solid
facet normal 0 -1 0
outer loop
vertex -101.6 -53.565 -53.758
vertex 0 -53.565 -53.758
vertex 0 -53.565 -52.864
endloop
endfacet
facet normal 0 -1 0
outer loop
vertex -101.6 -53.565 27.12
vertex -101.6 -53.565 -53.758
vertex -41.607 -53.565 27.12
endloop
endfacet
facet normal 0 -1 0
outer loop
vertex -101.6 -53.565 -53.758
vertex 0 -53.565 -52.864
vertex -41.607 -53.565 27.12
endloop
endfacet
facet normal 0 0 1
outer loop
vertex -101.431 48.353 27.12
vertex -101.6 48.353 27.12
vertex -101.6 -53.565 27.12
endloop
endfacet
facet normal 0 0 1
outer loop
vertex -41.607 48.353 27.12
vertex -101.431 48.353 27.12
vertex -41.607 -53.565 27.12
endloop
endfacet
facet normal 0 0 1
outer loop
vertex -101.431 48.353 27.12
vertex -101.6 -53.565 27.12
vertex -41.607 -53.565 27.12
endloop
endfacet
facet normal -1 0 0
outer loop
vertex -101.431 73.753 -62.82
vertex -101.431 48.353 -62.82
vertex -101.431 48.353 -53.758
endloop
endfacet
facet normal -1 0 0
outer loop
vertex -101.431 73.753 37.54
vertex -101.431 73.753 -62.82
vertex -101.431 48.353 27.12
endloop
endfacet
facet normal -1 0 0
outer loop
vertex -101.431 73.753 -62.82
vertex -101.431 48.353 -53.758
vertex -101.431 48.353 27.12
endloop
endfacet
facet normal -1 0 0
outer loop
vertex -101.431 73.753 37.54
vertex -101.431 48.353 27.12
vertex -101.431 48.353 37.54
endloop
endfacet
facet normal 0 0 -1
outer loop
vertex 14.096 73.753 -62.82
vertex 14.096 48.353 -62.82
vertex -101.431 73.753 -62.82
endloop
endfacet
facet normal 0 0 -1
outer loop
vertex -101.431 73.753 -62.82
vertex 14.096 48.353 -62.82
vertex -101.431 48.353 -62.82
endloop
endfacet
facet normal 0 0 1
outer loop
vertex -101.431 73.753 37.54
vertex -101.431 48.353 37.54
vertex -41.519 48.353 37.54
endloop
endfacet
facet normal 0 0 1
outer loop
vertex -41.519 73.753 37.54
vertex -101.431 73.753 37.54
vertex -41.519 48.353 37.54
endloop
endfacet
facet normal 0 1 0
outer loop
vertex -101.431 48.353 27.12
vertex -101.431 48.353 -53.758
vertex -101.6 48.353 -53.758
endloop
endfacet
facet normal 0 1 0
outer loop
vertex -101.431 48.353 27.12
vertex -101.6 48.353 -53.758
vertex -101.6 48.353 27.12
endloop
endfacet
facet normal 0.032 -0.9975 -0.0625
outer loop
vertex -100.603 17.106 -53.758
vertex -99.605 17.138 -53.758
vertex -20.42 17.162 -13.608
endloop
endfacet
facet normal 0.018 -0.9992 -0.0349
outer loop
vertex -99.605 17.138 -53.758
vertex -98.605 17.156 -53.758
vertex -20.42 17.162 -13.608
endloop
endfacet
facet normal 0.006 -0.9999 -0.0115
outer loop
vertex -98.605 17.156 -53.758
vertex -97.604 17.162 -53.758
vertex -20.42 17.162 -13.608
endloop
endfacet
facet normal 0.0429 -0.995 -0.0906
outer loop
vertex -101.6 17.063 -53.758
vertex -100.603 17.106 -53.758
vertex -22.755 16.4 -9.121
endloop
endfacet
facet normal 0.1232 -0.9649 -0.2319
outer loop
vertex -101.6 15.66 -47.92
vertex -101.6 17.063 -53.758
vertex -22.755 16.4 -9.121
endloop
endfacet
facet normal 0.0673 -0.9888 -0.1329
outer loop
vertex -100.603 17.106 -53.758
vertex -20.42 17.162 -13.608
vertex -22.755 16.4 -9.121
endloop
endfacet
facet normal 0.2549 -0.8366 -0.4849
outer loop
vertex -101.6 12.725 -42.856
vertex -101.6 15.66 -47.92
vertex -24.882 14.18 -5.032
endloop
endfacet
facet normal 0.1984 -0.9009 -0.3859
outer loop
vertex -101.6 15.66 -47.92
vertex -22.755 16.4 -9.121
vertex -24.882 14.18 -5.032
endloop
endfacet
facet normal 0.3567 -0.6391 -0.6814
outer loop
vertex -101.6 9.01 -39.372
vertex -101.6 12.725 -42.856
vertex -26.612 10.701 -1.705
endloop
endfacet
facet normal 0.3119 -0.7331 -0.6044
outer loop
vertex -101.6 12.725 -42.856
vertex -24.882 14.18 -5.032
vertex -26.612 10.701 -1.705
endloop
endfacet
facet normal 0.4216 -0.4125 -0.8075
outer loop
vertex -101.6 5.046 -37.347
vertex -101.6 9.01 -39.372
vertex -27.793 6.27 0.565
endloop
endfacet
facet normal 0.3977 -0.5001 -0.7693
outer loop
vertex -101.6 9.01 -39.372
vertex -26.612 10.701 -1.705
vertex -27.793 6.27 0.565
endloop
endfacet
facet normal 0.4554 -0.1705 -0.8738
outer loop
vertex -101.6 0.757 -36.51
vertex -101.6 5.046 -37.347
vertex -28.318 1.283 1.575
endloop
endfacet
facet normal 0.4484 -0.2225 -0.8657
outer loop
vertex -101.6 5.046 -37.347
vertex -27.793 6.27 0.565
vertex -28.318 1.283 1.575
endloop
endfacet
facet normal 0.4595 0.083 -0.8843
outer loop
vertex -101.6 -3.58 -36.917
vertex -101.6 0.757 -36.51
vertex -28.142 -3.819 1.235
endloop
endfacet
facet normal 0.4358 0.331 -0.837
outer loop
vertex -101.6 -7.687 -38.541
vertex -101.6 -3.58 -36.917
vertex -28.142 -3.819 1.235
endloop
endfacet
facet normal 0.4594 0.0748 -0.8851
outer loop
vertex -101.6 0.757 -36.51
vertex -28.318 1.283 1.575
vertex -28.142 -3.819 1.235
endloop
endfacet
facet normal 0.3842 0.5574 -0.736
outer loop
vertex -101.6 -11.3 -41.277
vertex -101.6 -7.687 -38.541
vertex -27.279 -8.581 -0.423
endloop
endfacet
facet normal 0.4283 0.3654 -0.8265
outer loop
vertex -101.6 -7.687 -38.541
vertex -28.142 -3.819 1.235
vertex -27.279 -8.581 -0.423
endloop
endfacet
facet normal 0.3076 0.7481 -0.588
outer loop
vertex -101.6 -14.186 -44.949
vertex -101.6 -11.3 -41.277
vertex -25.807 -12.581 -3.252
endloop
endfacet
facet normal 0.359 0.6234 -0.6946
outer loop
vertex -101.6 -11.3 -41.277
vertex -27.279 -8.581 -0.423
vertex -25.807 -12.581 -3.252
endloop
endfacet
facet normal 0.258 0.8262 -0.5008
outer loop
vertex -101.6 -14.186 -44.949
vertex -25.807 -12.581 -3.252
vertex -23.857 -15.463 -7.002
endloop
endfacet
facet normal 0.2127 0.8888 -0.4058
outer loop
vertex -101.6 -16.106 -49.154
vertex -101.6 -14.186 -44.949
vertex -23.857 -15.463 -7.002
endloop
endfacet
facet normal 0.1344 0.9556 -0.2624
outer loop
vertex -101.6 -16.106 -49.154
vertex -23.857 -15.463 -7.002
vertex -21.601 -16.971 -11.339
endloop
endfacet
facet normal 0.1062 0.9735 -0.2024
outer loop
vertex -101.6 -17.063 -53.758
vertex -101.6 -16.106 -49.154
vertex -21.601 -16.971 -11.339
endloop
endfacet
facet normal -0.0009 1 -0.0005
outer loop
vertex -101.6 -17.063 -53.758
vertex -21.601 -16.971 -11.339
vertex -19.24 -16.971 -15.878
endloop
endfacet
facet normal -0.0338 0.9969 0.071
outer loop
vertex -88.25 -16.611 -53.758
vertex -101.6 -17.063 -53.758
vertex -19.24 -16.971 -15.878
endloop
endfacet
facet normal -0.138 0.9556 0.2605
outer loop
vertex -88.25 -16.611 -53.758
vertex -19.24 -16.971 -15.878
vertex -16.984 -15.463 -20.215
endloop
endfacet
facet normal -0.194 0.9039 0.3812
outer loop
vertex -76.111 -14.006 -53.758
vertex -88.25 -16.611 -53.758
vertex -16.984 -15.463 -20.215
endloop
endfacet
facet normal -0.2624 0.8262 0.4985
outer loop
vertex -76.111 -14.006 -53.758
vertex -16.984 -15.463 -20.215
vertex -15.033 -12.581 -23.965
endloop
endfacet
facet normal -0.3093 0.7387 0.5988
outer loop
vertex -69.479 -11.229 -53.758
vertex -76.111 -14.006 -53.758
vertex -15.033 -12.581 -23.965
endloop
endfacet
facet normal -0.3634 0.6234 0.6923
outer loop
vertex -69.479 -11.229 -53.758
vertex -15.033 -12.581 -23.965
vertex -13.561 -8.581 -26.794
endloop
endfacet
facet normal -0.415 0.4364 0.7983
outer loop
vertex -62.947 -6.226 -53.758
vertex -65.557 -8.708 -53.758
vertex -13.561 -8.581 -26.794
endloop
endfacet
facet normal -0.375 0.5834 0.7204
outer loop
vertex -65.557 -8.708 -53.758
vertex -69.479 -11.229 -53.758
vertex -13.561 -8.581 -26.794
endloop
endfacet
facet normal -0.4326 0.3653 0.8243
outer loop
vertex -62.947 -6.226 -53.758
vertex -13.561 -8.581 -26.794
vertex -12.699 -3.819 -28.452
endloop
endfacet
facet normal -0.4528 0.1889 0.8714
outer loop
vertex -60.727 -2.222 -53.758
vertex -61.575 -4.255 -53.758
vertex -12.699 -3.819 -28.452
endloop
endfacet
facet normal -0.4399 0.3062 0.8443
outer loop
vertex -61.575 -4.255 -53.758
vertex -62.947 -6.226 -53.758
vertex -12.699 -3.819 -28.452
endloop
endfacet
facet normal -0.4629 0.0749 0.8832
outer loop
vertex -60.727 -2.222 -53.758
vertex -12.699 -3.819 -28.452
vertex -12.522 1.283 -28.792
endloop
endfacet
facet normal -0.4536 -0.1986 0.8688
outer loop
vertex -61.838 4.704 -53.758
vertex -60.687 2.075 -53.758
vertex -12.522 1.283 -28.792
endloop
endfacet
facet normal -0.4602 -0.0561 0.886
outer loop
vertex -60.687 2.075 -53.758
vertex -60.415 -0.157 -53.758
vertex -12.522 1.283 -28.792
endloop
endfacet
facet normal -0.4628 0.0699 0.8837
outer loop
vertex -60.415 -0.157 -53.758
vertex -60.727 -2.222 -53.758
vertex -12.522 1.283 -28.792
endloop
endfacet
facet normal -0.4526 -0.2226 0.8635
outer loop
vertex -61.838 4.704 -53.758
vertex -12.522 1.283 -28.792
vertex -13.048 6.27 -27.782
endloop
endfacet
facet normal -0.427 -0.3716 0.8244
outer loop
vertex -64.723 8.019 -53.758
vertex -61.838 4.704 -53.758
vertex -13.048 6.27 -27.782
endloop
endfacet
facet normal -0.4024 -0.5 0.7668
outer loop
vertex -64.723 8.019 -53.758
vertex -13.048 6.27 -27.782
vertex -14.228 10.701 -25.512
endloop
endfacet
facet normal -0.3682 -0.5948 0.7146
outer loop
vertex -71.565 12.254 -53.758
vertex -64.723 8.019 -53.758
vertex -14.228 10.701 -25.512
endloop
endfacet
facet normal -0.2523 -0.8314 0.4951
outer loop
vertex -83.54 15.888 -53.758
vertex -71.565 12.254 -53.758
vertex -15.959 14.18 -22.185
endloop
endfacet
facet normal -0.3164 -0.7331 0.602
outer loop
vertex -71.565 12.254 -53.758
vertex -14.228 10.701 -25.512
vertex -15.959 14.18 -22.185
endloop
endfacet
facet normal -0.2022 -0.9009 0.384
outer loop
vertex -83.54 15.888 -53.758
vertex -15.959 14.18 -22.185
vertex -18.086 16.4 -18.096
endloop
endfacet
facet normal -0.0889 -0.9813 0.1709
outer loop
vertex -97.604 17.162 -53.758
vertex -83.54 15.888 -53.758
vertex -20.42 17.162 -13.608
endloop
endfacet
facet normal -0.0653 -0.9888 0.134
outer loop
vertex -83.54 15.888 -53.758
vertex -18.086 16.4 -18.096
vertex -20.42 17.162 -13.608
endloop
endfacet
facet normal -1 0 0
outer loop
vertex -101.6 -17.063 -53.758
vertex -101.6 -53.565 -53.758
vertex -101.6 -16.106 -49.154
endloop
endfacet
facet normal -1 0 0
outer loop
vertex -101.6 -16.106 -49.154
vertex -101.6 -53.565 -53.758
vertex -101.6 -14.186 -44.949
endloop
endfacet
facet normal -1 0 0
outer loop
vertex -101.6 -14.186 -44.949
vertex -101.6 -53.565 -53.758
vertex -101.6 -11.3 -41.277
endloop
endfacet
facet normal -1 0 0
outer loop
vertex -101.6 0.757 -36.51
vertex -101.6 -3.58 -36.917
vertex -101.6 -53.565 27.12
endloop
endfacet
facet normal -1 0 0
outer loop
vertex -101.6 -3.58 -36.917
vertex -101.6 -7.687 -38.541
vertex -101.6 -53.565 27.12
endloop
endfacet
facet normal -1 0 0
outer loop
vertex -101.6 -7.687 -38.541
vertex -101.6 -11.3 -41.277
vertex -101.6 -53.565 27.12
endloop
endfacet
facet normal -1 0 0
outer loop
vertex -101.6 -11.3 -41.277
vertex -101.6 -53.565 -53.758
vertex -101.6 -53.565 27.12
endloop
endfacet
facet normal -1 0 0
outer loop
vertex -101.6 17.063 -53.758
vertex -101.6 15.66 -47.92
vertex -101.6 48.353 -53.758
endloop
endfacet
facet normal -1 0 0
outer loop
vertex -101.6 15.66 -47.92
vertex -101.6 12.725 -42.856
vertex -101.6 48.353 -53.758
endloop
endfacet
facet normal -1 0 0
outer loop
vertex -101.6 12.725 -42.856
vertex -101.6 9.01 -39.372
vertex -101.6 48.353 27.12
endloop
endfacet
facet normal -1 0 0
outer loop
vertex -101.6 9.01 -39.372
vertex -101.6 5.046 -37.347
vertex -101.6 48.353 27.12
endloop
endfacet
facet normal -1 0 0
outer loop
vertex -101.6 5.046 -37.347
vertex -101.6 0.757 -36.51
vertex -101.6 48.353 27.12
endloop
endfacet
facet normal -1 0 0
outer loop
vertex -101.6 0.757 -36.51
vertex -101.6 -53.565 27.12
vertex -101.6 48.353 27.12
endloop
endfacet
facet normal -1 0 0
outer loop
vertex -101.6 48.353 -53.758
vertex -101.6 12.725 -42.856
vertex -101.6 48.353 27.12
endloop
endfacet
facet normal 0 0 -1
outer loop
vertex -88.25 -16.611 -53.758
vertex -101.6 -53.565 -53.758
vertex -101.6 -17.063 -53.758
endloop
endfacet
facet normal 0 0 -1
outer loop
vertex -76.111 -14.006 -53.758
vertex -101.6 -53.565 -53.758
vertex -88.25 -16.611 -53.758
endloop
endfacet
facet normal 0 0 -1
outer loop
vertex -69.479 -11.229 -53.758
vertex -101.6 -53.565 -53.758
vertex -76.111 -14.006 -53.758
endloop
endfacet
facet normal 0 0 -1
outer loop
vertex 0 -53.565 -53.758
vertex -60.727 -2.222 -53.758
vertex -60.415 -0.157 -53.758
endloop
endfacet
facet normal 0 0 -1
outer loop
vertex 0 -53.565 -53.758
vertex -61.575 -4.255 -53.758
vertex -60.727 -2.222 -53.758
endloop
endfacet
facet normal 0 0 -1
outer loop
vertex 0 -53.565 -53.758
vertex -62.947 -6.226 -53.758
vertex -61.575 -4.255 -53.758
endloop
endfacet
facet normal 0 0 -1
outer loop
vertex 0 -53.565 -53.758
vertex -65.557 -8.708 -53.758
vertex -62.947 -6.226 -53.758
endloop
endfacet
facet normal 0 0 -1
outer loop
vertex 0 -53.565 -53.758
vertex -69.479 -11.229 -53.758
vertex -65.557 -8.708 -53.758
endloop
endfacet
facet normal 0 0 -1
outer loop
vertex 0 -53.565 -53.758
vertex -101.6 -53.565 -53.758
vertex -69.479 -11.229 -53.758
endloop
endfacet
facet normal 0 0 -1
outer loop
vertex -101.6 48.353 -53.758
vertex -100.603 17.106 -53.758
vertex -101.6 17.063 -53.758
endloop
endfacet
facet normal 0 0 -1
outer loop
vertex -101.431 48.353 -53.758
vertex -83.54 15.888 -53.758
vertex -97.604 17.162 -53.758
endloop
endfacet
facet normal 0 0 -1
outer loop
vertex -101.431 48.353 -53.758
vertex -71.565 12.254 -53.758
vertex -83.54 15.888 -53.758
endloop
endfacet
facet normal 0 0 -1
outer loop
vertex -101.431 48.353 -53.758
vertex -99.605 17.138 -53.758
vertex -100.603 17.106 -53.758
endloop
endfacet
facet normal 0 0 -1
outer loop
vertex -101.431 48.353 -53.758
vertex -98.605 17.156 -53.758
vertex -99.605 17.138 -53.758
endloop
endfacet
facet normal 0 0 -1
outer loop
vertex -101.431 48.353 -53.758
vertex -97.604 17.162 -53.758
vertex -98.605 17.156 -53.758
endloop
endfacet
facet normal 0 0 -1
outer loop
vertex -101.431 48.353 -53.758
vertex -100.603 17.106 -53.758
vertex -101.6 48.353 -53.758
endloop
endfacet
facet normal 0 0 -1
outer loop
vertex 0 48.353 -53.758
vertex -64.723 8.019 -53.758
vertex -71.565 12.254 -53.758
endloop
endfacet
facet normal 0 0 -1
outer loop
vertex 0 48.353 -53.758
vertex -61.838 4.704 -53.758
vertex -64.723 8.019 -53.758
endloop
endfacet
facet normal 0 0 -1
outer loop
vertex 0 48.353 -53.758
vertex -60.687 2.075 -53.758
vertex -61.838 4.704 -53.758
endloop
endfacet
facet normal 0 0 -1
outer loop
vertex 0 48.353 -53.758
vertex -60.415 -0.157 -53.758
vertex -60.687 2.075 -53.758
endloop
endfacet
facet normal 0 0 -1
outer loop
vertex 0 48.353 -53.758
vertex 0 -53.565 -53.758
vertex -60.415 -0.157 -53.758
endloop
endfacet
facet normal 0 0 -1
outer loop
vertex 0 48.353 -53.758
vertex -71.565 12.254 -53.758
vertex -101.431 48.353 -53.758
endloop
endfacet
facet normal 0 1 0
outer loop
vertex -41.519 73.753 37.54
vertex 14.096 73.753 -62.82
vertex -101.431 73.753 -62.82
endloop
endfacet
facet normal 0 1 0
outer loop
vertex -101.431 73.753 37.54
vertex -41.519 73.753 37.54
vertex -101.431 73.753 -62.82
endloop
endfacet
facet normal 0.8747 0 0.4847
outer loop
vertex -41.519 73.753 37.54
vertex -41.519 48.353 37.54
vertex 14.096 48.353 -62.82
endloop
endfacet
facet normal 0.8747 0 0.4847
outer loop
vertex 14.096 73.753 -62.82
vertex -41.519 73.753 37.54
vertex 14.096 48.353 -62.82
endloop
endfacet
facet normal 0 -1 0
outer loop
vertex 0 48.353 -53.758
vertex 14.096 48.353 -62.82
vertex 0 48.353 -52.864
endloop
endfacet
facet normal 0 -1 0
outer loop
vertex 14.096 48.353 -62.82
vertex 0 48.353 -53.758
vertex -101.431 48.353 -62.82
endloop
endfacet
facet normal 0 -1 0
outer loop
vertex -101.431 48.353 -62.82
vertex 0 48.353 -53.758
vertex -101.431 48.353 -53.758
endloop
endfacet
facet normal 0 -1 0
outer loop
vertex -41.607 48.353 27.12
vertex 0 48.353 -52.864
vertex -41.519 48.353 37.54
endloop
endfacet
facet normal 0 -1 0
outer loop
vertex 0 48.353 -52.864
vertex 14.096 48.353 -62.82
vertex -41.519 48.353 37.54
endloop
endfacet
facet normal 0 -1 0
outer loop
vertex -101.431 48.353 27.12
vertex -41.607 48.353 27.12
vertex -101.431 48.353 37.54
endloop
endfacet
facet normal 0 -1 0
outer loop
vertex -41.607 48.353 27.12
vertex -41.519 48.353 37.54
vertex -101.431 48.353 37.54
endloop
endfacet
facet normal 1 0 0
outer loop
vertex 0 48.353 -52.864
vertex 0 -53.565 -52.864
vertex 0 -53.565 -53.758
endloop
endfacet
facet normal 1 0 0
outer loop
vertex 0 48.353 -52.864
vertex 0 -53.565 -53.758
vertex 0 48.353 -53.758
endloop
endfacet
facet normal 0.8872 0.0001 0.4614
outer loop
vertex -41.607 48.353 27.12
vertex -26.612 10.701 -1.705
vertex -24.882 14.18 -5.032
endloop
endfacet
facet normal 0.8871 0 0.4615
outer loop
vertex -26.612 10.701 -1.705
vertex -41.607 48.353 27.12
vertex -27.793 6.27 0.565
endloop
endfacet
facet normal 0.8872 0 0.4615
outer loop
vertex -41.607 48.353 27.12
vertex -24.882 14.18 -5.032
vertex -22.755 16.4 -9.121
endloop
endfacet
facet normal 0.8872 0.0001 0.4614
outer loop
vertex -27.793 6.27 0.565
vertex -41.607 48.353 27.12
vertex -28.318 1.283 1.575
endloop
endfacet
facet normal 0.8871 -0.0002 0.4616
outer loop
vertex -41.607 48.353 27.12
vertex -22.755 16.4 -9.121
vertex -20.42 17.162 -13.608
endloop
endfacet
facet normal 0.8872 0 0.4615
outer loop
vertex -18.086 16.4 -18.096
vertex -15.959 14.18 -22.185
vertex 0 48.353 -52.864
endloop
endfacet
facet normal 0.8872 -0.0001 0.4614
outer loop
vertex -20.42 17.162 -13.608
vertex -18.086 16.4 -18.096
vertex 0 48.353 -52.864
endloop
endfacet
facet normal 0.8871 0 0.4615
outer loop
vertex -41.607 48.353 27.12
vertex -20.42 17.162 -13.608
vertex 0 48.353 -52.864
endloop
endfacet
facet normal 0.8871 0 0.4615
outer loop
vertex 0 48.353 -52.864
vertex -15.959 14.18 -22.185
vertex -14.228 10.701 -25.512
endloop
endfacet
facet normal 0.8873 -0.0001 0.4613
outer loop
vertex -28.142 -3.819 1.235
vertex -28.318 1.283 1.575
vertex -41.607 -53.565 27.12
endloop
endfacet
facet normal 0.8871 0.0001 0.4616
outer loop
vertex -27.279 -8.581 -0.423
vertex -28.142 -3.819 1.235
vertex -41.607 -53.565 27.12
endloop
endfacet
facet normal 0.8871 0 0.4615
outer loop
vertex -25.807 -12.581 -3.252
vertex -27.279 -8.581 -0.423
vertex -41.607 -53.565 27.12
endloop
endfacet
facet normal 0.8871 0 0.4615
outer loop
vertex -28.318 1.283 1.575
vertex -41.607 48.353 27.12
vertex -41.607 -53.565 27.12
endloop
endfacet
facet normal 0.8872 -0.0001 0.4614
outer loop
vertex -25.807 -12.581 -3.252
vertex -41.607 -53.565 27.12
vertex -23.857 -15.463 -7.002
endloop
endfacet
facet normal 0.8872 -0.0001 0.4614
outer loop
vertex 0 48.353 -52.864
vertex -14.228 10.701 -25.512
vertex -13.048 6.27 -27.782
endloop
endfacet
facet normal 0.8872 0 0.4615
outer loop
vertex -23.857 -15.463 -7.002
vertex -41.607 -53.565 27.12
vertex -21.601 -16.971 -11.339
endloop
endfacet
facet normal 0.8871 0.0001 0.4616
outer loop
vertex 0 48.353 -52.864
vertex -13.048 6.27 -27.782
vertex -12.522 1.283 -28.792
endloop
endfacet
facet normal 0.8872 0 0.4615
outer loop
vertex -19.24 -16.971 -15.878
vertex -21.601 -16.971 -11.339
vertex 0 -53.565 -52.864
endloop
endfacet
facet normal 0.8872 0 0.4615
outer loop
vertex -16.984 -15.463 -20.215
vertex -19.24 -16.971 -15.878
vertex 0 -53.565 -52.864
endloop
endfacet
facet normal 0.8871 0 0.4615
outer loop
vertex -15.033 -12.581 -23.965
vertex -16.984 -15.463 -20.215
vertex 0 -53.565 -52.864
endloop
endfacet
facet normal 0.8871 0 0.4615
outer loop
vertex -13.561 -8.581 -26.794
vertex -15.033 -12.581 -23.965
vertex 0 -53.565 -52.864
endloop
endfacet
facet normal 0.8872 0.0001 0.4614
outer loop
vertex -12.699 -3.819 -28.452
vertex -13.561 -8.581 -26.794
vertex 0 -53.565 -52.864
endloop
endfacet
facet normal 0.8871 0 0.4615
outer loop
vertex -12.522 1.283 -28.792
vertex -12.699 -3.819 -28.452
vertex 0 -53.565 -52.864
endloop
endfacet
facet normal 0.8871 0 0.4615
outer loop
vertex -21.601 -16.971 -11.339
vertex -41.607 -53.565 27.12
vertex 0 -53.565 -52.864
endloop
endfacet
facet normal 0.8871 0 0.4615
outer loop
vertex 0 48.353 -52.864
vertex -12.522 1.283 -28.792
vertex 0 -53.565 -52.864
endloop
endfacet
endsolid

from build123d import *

# Parameters (mm, degrees)
F0_W      = 101.9186489284
F0_H      = 107.1304008365
F1_DEPTH  = 101.6
F3_DEPTH  = 101.9196489284
F5_DEPTH  = 101.9196489284
F6_R      = 17.1624207675
F7_DEPTH  = 90.5480102046
F10_DEPTH = 25.4


with BuildPart() as f1:
    # F0 (on Right) → F1 (new body)
    with BuildSketch(Plane.YZ):
        with Locations((-2.605875954, -0.1930259168)):
            Rectangle(F0_W, F0_H)
    extrude(amount=-F1_DEPTH)

    # F2 (on face) → F3 (cut, through all)
    with BuildSketch(Plane.XZ.offset(53.5652004182)):
        Polygon((13.0692059174, 68.6213597655), (-55.2626177669, 53.3721745014), (9.4016781077, -70.9377005696), align=None)
    extrude(amount=-F3_DEPTH, mode=Mode.SUBTRACT)

    # F4 (on face) → F5 (cut, through all)
    with BuildSketch(Plane.XZ.offset(53.5652004182)):
        Polygon((-121.2781071663, 53.3721745014), (-122.0502182841, 27.1203983575), (-16.0779859871, 27.1203983575), (-20.7106489688, 66.1120042205), align=None)
    extrude(amount=-F5_DEPTH, mode=Mode.SUBTRACT)

    # F6 (on face) → F7 (cut, through all)
    with BuildSketch(Plane(origin=(-21.6427491721, 0, -11.2582619458), x_dir=(0, 1, 0), z_dir=(0.8871491354, 0, 0.4614828399))):
        with Locations((0, -2.6491538156)):
            Circle(F6_R)
    extrude(amount=-F7_DEPTH, mode=Mode.SUBTRACT)

    # F9 (on face) → F10 (join)
    with BuildSketch(Plane(origin=(0, 48.3534485102, 0), x_dir=(-1, 0, 0), z_dir=(0, 1, 0))):
        Polygon((101.431466639, -54.2247891426), (101.431466639, 37.5402383506), (41.5187701583, 37.5402383506), (-14.0963997692, -62.819853425), (101.431466639, -62.819853425), align=None)
    extrude(amount=F10_DEPTH)


solid = f1.part
